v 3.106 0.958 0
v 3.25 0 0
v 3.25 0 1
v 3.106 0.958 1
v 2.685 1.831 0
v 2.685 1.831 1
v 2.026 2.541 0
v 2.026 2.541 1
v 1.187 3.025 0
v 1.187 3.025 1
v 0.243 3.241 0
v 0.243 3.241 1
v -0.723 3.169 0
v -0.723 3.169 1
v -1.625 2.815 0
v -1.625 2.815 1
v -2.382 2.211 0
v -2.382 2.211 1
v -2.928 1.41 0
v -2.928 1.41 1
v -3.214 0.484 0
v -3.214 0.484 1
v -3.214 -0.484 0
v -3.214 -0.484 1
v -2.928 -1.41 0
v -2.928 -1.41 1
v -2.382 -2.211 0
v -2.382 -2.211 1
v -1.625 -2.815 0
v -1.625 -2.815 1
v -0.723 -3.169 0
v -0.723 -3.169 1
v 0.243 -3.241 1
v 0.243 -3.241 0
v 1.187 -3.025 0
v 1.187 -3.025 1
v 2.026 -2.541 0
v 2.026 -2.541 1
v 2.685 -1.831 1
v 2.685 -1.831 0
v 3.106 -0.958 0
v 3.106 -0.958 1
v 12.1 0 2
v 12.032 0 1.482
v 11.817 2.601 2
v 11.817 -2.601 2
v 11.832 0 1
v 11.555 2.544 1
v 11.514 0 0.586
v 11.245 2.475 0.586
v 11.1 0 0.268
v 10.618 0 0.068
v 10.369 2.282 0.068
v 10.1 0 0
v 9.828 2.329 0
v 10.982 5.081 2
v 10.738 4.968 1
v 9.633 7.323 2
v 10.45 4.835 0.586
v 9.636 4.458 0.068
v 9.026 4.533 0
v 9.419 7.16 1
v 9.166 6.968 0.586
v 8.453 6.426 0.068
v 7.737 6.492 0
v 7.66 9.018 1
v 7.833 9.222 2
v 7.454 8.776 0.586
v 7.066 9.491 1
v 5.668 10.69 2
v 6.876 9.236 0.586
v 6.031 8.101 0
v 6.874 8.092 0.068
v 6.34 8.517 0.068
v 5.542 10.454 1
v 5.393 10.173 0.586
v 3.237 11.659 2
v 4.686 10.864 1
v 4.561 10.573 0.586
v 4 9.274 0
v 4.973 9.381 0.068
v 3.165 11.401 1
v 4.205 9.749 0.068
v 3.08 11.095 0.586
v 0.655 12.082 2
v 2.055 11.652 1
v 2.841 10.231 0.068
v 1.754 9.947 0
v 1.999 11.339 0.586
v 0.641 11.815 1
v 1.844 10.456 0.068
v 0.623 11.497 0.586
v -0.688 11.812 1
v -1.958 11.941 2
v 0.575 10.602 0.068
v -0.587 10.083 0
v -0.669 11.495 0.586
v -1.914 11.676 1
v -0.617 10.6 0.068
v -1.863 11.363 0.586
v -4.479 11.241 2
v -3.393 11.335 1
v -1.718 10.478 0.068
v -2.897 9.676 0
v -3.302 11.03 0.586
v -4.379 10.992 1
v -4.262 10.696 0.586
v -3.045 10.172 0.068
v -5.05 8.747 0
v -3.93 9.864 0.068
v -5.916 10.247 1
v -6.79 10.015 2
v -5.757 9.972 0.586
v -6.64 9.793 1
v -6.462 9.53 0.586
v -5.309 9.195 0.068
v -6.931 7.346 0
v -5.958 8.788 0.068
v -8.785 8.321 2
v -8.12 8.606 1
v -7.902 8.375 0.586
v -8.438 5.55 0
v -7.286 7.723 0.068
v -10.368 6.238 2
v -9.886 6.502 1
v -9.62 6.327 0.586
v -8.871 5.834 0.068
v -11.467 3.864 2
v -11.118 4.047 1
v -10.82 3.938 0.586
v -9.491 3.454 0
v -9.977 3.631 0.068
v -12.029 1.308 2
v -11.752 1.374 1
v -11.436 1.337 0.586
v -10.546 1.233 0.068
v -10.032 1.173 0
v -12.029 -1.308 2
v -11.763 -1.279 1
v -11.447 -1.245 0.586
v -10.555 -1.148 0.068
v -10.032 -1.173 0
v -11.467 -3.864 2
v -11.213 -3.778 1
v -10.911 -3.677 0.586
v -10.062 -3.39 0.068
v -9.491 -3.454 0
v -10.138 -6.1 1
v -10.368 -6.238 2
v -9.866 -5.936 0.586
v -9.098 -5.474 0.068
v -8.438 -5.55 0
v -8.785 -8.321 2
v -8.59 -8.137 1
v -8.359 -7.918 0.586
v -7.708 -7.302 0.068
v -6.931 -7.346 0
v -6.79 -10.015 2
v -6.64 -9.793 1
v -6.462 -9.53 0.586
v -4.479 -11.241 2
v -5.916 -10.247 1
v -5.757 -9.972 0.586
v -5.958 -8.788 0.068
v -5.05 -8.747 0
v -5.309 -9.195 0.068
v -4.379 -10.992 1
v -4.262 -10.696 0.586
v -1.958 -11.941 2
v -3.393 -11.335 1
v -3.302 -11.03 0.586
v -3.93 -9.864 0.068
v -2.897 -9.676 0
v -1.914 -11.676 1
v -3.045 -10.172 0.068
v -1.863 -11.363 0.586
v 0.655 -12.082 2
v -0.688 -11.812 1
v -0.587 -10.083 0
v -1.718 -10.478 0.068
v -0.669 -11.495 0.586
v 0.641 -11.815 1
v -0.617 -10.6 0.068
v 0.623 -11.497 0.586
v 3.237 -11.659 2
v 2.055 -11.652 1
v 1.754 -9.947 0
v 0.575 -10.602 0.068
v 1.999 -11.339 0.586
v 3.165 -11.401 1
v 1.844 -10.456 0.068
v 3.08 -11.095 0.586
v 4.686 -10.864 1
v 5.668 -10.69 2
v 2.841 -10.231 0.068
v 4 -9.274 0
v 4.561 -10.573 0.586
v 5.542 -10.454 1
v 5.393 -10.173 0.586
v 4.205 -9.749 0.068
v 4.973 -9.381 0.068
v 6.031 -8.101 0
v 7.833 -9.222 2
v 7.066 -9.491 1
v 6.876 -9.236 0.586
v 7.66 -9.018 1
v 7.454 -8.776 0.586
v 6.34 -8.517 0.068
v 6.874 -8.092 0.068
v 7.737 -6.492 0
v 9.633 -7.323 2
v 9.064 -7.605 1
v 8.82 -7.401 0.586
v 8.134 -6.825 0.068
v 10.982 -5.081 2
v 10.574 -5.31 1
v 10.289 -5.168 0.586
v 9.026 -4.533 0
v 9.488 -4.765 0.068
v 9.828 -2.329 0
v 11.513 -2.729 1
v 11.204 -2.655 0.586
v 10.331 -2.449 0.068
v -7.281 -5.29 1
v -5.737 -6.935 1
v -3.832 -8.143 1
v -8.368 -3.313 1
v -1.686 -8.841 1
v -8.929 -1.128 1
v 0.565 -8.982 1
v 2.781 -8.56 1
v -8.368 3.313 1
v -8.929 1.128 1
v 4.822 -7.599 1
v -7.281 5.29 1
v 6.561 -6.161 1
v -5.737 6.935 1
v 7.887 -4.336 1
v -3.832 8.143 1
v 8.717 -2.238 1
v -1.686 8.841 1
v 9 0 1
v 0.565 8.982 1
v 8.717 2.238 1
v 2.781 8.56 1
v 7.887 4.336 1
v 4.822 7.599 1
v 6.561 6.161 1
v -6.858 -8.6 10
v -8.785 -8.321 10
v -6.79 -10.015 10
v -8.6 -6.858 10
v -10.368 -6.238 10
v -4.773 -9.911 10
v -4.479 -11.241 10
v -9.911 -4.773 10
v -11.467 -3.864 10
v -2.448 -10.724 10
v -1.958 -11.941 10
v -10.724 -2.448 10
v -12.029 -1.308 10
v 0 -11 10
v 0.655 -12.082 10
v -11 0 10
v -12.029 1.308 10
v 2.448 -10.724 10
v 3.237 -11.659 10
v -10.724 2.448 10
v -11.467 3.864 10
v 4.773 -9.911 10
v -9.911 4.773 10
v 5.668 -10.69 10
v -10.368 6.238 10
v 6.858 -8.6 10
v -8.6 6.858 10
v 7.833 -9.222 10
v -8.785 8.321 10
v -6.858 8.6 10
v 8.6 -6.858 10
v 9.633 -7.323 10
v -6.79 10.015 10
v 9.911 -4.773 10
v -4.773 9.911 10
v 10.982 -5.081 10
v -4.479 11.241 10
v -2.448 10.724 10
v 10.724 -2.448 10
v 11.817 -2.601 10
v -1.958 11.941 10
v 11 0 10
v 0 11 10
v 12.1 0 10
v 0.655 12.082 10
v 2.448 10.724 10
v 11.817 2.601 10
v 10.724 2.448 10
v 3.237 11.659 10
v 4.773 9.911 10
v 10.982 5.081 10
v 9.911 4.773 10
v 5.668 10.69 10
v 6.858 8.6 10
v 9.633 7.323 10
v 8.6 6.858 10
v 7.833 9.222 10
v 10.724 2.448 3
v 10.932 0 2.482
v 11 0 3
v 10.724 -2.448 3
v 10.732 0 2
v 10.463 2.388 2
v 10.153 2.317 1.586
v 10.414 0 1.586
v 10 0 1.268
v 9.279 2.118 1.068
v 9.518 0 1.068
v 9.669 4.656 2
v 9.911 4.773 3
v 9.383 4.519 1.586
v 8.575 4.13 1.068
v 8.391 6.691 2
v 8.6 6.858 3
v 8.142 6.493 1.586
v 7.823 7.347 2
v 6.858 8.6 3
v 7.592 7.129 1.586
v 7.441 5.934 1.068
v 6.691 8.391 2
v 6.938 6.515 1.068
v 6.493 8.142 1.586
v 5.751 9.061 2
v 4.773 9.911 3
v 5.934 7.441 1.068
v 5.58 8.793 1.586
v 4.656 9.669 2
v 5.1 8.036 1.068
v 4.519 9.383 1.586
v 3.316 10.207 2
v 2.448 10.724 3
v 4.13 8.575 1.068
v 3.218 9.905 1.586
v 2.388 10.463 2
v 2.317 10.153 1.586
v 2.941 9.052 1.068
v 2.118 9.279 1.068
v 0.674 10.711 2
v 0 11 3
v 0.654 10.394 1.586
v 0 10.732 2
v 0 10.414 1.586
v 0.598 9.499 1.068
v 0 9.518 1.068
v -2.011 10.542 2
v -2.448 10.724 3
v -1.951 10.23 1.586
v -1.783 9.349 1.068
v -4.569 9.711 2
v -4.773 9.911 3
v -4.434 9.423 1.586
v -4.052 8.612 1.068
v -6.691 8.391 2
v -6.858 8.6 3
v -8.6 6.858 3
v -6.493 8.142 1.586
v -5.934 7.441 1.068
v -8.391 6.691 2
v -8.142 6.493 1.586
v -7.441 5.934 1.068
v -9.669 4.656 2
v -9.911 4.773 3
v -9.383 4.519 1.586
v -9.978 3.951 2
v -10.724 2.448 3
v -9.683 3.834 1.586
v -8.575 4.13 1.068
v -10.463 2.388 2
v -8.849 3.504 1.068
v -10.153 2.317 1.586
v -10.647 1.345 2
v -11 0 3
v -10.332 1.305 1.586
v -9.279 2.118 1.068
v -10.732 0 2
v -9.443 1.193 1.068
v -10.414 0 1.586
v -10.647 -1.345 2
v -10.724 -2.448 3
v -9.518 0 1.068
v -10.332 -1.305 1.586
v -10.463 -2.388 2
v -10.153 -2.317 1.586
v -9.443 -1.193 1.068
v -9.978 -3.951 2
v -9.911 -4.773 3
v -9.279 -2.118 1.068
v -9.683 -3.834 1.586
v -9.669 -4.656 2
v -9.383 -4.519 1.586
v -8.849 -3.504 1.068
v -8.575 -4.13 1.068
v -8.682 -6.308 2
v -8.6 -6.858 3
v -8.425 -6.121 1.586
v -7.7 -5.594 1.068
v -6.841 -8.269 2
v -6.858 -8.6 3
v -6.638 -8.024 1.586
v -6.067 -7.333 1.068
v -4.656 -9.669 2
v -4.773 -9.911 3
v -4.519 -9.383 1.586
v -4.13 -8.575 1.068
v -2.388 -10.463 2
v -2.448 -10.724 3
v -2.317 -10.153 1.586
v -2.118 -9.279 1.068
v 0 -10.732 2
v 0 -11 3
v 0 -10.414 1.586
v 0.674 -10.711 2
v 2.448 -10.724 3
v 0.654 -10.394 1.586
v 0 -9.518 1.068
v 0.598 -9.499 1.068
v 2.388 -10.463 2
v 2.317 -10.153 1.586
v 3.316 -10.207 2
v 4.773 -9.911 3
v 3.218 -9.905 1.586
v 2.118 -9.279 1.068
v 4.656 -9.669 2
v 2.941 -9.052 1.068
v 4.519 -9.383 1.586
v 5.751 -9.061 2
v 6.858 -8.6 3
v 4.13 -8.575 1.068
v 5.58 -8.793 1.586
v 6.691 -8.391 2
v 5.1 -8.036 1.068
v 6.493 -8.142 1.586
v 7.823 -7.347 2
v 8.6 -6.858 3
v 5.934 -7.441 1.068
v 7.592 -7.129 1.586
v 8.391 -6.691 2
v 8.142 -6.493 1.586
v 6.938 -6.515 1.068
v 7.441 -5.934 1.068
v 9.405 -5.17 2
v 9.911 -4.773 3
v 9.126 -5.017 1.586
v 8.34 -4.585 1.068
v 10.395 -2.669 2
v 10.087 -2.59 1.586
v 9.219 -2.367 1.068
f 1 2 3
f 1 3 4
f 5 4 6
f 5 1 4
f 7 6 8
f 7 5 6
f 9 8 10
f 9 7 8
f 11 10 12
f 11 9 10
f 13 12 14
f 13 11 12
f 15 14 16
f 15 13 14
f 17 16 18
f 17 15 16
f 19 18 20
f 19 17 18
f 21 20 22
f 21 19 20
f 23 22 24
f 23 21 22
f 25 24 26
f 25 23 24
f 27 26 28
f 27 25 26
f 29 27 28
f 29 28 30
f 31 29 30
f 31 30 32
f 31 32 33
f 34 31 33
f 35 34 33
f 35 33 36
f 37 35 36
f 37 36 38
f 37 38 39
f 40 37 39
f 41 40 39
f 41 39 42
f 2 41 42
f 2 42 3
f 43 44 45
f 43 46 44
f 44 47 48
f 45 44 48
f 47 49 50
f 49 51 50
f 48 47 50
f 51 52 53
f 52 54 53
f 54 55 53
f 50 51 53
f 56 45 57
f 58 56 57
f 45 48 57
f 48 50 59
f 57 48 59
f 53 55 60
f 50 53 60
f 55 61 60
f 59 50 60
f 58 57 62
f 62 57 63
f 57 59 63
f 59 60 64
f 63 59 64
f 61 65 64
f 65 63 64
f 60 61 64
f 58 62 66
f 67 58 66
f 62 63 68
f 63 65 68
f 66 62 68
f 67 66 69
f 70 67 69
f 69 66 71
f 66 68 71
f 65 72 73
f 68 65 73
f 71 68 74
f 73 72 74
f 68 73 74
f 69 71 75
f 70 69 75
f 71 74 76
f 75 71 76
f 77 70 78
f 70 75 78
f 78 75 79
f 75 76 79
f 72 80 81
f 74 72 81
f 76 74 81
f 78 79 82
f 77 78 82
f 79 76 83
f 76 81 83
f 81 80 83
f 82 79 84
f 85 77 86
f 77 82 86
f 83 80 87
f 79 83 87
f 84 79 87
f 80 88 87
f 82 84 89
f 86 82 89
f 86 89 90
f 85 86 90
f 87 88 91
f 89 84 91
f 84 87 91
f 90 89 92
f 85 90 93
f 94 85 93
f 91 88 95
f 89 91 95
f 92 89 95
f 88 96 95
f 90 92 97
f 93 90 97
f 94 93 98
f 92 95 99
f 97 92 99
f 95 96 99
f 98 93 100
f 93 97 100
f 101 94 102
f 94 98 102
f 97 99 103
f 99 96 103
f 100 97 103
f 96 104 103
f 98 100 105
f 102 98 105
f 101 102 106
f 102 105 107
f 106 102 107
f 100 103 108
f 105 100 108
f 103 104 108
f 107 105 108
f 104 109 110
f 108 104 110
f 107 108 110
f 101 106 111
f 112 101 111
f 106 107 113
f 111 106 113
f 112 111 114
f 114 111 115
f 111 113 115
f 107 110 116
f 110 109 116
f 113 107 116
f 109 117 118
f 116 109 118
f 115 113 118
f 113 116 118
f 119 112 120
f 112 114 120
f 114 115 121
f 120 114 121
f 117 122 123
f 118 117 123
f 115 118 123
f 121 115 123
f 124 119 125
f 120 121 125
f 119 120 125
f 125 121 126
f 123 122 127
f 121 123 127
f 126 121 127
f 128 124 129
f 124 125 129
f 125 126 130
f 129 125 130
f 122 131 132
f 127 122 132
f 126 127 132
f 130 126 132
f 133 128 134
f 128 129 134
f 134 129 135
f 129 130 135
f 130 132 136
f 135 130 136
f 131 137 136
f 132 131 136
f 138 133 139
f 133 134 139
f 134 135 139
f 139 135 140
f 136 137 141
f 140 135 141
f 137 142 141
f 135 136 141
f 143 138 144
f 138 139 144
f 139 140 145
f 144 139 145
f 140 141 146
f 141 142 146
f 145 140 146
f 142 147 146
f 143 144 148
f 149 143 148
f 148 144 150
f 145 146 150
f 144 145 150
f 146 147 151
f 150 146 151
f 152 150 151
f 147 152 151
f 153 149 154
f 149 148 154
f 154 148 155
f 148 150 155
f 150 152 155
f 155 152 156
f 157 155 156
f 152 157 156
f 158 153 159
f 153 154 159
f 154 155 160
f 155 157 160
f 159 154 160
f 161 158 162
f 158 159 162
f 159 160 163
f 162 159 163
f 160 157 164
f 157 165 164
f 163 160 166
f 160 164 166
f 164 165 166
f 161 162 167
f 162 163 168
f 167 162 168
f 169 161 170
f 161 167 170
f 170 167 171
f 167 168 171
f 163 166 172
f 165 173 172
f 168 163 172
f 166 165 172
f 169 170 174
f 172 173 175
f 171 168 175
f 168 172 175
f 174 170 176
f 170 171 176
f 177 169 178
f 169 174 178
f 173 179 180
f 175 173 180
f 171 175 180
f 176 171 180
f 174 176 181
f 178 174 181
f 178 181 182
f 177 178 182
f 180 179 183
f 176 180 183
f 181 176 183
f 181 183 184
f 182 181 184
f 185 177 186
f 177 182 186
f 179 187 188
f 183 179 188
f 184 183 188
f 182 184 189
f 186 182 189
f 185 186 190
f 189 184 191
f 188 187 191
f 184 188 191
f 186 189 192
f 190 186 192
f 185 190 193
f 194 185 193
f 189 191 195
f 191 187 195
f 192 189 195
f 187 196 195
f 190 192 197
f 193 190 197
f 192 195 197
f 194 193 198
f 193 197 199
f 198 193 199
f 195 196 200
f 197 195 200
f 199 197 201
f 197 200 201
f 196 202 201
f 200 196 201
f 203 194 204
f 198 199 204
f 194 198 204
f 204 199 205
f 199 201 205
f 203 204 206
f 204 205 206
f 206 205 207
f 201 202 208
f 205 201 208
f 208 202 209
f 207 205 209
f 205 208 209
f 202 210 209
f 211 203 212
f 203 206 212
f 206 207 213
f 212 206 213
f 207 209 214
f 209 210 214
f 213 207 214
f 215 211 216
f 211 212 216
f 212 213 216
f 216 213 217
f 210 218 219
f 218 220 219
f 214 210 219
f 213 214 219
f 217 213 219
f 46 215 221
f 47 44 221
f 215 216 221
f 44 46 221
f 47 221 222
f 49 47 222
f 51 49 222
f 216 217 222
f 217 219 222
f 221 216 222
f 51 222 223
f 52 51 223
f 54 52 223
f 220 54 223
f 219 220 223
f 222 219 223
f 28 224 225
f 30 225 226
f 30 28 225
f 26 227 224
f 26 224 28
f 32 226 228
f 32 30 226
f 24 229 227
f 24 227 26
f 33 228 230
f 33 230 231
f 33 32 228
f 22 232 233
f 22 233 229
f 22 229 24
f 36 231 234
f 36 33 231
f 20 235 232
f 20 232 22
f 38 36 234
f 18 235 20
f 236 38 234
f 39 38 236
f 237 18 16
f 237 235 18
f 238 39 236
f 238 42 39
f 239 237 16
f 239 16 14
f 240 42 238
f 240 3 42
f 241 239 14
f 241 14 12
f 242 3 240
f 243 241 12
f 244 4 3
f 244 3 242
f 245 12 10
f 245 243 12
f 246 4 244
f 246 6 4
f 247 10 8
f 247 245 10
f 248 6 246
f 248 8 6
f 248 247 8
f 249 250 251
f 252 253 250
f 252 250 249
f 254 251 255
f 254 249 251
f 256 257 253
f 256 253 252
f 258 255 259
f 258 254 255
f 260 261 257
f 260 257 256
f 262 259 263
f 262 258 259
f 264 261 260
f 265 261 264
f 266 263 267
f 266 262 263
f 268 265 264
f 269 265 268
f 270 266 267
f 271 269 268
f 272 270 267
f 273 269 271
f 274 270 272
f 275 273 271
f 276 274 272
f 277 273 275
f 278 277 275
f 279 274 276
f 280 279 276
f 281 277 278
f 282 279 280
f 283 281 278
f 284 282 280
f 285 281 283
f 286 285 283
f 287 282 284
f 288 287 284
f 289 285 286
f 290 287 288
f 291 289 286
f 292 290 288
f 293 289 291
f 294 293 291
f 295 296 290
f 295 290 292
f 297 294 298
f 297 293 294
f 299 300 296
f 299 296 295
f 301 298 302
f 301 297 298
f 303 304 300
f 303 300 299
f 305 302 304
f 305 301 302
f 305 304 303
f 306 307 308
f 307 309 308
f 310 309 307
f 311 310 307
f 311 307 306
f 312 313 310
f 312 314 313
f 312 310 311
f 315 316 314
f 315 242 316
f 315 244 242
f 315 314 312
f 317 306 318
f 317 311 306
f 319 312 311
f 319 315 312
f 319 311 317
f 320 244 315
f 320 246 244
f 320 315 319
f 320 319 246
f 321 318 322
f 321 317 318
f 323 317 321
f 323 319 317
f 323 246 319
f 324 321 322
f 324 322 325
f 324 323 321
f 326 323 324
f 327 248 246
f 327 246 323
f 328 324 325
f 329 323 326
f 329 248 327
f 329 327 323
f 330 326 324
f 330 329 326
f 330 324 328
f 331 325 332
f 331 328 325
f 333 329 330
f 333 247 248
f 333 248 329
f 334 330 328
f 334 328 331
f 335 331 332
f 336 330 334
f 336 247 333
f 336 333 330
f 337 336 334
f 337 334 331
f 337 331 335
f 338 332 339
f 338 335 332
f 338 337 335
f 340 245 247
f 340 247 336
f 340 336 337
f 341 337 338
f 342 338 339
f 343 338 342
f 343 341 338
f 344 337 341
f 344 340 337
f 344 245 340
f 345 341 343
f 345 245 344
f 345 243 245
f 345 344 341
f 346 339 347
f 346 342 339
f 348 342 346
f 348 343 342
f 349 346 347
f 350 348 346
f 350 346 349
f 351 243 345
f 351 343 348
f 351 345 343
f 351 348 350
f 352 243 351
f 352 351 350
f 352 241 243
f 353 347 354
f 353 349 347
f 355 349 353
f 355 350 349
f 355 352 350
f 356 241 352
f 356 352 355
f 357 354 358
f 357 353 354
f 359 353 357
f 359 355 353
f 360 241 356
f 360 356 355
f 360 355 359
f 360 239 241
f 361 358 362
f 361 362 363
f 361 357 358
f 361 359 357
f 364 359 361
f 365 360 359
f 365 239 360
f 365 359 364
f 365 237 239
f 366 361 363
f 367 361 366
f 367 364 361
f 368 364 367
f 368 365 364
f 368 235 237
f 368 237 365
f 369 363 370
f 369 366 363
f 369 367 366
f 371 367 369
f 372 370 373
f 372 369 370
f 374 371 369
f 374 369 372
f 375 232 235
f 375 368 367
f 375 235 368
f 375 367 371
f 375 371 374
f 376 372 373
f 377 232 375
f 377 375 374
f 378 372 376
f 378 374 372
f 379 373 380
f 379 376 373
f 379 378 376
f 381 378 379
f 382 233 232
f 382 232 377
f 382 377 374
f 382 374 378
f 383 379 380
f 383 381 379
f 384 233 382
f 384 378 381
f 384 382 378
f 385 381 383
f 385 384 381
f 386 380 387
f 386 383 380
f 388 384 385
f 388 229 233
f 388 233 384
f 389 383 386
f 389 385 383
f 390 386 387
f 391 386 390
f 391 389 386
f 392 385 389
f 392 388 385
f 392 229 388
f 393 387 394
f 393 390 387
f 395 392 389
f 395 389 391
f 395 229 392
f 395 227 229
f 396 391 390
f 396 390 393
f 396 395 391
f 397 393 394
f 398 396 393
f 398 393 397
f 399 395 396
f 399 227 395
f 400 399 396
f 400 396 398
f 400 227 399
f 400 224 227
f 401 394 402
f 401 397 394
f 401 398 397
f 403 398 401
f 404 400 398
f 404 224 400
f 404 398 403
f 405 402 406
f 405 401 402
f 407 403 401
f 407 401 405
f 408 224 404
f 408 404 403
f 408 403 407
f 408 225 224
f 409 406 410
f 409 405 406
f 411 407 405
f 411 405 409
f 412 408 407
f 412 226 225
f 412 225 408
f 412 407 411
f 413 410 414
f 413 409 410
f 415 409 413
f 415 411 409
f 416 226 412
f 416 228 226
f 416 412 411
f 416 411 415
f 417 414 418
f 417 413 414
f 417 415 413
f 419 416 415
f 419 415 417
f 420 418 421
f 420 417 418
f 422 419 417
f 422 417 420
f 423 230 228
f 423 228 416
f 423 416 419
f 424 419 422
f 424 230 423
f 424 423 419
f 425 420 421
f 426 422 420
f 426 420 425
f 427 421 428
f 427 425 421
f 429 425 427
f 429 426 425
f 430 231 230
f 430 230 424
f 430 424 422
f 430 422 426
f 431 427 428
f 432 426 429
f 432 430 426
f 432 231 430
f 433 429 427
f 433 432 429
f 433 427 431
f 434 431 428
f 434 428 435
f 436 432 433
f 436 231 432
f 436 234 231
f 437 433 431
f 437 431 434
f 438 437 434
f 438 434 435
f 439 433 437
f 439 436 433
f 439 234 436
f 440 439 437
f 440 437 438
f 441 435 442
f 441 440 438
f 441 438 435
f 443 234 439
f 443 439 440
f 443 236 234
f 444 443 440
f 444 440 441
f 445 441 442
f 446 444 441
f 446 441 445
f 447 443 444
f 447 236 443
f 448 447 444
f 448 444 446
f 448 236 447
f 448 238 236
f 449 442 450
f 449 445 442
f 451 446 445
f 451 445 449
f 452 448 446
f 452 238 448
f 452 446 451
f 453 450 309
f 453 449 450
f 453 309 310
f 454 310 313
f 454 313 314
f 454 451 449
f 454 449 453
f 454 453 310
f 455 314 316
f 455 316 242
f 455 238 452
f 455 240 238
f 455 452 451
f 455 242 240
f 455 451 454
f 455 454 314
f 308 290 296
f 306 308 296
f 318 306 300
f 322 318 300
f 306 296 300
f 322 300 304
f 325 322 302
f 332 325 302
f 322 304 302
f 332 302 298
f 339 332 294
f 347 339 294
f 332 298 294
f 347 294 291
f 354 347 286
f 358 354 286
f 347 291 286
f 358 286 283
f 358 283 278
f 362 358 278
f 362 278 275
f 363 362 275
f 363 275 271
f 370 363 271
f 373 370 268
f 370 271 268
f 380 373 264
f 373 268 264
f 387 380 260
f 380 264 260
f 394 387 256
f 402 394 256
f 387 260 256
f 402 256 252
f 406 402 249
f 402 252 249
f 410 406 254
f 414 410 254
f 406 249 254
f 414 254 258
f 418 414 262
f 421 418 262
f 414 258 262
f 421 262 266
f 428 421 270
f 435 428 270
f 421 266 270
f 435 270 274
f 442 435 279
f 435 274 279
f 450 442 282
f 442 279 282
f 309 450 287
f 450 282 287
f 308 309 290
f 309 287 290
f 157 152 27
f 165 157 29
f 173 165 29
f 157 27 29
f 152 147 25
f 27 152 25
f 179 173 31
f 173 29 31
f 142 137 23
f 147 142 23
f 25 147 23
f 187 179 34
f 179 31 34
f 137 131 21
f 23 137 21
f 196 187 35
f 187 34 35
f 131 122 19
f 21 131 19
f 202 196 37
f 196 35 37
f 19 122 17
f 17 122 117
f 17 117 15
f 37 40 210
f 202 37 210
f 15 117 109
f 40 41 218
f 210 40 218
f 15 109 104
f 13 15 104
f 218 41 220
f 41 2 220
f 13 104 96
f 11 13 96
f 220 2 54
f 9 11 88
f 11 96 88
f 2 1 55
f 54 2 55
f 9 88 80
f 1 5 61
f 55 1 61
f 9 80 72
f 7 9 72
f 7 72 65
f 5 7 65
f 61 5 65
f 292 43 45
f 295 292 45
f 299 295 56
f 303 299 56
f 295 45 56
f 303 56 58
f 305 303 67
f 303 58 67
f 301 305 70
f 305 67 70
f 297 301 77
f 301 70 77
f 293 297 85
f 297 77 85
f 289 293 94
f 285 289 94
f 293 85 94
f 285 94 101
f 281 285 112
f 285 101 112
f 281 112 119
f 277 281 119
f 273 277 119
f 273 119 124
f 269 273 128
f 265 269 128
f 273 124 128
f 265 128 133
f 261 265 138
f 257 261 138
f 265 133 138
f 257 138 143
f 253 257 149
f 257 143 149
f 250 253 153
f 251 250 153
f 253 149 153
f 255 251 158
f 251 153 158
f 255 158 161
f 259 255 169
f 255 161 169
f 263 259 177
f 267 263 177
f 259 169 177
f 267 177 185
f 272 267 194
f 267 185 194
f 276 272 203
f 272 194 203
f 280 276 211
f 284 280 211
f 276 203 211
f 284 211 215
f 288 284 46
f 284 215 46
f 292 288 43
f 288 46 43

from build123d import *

# Parameters (mm, degrees)
F0_R     = 12.1
F0_R_2   = 3.25
F1_DEPTH = 10
F2_R     = 11
F2_R_2   = 3.25
F3_DEPTH = 9
F4_R     = 2
F5_R     = 2


with BuildPart() as f1:
    # F0 (on Top) → F1 (new body)
    with BuildSketch(Plane.XY):
        Circle(F0_R)
        Circle(F0_R_2, mode=Mode.SUBTRACT)
    extrude(amount=F1_DEPTH)

    # F2 (on face) → F3 (cut)
    with BuildSketch(Plane.XY.offset(10)):
        Circle(F2_R)
        Circle(F2_R_2, mode=Mode.SUBTRACT)
    extrude(amount=-F3_DEPTH, mode=Mode.SUBTRACT)

    # F4
    f4_edges = [f1.edges().sort_by_distance(p)[0] for p in [
        (-12.1, 0, 0),
    ]]
    fillet(f4_edges, radius=F4_R)

    # F5
    f5_edges = [f1.edges().sort_by_distance(p)[0] for p in [
        (-11, 0, 1),
    ]]
    fillet(f5_edges, radius=F5_R)


solid = f1.part
